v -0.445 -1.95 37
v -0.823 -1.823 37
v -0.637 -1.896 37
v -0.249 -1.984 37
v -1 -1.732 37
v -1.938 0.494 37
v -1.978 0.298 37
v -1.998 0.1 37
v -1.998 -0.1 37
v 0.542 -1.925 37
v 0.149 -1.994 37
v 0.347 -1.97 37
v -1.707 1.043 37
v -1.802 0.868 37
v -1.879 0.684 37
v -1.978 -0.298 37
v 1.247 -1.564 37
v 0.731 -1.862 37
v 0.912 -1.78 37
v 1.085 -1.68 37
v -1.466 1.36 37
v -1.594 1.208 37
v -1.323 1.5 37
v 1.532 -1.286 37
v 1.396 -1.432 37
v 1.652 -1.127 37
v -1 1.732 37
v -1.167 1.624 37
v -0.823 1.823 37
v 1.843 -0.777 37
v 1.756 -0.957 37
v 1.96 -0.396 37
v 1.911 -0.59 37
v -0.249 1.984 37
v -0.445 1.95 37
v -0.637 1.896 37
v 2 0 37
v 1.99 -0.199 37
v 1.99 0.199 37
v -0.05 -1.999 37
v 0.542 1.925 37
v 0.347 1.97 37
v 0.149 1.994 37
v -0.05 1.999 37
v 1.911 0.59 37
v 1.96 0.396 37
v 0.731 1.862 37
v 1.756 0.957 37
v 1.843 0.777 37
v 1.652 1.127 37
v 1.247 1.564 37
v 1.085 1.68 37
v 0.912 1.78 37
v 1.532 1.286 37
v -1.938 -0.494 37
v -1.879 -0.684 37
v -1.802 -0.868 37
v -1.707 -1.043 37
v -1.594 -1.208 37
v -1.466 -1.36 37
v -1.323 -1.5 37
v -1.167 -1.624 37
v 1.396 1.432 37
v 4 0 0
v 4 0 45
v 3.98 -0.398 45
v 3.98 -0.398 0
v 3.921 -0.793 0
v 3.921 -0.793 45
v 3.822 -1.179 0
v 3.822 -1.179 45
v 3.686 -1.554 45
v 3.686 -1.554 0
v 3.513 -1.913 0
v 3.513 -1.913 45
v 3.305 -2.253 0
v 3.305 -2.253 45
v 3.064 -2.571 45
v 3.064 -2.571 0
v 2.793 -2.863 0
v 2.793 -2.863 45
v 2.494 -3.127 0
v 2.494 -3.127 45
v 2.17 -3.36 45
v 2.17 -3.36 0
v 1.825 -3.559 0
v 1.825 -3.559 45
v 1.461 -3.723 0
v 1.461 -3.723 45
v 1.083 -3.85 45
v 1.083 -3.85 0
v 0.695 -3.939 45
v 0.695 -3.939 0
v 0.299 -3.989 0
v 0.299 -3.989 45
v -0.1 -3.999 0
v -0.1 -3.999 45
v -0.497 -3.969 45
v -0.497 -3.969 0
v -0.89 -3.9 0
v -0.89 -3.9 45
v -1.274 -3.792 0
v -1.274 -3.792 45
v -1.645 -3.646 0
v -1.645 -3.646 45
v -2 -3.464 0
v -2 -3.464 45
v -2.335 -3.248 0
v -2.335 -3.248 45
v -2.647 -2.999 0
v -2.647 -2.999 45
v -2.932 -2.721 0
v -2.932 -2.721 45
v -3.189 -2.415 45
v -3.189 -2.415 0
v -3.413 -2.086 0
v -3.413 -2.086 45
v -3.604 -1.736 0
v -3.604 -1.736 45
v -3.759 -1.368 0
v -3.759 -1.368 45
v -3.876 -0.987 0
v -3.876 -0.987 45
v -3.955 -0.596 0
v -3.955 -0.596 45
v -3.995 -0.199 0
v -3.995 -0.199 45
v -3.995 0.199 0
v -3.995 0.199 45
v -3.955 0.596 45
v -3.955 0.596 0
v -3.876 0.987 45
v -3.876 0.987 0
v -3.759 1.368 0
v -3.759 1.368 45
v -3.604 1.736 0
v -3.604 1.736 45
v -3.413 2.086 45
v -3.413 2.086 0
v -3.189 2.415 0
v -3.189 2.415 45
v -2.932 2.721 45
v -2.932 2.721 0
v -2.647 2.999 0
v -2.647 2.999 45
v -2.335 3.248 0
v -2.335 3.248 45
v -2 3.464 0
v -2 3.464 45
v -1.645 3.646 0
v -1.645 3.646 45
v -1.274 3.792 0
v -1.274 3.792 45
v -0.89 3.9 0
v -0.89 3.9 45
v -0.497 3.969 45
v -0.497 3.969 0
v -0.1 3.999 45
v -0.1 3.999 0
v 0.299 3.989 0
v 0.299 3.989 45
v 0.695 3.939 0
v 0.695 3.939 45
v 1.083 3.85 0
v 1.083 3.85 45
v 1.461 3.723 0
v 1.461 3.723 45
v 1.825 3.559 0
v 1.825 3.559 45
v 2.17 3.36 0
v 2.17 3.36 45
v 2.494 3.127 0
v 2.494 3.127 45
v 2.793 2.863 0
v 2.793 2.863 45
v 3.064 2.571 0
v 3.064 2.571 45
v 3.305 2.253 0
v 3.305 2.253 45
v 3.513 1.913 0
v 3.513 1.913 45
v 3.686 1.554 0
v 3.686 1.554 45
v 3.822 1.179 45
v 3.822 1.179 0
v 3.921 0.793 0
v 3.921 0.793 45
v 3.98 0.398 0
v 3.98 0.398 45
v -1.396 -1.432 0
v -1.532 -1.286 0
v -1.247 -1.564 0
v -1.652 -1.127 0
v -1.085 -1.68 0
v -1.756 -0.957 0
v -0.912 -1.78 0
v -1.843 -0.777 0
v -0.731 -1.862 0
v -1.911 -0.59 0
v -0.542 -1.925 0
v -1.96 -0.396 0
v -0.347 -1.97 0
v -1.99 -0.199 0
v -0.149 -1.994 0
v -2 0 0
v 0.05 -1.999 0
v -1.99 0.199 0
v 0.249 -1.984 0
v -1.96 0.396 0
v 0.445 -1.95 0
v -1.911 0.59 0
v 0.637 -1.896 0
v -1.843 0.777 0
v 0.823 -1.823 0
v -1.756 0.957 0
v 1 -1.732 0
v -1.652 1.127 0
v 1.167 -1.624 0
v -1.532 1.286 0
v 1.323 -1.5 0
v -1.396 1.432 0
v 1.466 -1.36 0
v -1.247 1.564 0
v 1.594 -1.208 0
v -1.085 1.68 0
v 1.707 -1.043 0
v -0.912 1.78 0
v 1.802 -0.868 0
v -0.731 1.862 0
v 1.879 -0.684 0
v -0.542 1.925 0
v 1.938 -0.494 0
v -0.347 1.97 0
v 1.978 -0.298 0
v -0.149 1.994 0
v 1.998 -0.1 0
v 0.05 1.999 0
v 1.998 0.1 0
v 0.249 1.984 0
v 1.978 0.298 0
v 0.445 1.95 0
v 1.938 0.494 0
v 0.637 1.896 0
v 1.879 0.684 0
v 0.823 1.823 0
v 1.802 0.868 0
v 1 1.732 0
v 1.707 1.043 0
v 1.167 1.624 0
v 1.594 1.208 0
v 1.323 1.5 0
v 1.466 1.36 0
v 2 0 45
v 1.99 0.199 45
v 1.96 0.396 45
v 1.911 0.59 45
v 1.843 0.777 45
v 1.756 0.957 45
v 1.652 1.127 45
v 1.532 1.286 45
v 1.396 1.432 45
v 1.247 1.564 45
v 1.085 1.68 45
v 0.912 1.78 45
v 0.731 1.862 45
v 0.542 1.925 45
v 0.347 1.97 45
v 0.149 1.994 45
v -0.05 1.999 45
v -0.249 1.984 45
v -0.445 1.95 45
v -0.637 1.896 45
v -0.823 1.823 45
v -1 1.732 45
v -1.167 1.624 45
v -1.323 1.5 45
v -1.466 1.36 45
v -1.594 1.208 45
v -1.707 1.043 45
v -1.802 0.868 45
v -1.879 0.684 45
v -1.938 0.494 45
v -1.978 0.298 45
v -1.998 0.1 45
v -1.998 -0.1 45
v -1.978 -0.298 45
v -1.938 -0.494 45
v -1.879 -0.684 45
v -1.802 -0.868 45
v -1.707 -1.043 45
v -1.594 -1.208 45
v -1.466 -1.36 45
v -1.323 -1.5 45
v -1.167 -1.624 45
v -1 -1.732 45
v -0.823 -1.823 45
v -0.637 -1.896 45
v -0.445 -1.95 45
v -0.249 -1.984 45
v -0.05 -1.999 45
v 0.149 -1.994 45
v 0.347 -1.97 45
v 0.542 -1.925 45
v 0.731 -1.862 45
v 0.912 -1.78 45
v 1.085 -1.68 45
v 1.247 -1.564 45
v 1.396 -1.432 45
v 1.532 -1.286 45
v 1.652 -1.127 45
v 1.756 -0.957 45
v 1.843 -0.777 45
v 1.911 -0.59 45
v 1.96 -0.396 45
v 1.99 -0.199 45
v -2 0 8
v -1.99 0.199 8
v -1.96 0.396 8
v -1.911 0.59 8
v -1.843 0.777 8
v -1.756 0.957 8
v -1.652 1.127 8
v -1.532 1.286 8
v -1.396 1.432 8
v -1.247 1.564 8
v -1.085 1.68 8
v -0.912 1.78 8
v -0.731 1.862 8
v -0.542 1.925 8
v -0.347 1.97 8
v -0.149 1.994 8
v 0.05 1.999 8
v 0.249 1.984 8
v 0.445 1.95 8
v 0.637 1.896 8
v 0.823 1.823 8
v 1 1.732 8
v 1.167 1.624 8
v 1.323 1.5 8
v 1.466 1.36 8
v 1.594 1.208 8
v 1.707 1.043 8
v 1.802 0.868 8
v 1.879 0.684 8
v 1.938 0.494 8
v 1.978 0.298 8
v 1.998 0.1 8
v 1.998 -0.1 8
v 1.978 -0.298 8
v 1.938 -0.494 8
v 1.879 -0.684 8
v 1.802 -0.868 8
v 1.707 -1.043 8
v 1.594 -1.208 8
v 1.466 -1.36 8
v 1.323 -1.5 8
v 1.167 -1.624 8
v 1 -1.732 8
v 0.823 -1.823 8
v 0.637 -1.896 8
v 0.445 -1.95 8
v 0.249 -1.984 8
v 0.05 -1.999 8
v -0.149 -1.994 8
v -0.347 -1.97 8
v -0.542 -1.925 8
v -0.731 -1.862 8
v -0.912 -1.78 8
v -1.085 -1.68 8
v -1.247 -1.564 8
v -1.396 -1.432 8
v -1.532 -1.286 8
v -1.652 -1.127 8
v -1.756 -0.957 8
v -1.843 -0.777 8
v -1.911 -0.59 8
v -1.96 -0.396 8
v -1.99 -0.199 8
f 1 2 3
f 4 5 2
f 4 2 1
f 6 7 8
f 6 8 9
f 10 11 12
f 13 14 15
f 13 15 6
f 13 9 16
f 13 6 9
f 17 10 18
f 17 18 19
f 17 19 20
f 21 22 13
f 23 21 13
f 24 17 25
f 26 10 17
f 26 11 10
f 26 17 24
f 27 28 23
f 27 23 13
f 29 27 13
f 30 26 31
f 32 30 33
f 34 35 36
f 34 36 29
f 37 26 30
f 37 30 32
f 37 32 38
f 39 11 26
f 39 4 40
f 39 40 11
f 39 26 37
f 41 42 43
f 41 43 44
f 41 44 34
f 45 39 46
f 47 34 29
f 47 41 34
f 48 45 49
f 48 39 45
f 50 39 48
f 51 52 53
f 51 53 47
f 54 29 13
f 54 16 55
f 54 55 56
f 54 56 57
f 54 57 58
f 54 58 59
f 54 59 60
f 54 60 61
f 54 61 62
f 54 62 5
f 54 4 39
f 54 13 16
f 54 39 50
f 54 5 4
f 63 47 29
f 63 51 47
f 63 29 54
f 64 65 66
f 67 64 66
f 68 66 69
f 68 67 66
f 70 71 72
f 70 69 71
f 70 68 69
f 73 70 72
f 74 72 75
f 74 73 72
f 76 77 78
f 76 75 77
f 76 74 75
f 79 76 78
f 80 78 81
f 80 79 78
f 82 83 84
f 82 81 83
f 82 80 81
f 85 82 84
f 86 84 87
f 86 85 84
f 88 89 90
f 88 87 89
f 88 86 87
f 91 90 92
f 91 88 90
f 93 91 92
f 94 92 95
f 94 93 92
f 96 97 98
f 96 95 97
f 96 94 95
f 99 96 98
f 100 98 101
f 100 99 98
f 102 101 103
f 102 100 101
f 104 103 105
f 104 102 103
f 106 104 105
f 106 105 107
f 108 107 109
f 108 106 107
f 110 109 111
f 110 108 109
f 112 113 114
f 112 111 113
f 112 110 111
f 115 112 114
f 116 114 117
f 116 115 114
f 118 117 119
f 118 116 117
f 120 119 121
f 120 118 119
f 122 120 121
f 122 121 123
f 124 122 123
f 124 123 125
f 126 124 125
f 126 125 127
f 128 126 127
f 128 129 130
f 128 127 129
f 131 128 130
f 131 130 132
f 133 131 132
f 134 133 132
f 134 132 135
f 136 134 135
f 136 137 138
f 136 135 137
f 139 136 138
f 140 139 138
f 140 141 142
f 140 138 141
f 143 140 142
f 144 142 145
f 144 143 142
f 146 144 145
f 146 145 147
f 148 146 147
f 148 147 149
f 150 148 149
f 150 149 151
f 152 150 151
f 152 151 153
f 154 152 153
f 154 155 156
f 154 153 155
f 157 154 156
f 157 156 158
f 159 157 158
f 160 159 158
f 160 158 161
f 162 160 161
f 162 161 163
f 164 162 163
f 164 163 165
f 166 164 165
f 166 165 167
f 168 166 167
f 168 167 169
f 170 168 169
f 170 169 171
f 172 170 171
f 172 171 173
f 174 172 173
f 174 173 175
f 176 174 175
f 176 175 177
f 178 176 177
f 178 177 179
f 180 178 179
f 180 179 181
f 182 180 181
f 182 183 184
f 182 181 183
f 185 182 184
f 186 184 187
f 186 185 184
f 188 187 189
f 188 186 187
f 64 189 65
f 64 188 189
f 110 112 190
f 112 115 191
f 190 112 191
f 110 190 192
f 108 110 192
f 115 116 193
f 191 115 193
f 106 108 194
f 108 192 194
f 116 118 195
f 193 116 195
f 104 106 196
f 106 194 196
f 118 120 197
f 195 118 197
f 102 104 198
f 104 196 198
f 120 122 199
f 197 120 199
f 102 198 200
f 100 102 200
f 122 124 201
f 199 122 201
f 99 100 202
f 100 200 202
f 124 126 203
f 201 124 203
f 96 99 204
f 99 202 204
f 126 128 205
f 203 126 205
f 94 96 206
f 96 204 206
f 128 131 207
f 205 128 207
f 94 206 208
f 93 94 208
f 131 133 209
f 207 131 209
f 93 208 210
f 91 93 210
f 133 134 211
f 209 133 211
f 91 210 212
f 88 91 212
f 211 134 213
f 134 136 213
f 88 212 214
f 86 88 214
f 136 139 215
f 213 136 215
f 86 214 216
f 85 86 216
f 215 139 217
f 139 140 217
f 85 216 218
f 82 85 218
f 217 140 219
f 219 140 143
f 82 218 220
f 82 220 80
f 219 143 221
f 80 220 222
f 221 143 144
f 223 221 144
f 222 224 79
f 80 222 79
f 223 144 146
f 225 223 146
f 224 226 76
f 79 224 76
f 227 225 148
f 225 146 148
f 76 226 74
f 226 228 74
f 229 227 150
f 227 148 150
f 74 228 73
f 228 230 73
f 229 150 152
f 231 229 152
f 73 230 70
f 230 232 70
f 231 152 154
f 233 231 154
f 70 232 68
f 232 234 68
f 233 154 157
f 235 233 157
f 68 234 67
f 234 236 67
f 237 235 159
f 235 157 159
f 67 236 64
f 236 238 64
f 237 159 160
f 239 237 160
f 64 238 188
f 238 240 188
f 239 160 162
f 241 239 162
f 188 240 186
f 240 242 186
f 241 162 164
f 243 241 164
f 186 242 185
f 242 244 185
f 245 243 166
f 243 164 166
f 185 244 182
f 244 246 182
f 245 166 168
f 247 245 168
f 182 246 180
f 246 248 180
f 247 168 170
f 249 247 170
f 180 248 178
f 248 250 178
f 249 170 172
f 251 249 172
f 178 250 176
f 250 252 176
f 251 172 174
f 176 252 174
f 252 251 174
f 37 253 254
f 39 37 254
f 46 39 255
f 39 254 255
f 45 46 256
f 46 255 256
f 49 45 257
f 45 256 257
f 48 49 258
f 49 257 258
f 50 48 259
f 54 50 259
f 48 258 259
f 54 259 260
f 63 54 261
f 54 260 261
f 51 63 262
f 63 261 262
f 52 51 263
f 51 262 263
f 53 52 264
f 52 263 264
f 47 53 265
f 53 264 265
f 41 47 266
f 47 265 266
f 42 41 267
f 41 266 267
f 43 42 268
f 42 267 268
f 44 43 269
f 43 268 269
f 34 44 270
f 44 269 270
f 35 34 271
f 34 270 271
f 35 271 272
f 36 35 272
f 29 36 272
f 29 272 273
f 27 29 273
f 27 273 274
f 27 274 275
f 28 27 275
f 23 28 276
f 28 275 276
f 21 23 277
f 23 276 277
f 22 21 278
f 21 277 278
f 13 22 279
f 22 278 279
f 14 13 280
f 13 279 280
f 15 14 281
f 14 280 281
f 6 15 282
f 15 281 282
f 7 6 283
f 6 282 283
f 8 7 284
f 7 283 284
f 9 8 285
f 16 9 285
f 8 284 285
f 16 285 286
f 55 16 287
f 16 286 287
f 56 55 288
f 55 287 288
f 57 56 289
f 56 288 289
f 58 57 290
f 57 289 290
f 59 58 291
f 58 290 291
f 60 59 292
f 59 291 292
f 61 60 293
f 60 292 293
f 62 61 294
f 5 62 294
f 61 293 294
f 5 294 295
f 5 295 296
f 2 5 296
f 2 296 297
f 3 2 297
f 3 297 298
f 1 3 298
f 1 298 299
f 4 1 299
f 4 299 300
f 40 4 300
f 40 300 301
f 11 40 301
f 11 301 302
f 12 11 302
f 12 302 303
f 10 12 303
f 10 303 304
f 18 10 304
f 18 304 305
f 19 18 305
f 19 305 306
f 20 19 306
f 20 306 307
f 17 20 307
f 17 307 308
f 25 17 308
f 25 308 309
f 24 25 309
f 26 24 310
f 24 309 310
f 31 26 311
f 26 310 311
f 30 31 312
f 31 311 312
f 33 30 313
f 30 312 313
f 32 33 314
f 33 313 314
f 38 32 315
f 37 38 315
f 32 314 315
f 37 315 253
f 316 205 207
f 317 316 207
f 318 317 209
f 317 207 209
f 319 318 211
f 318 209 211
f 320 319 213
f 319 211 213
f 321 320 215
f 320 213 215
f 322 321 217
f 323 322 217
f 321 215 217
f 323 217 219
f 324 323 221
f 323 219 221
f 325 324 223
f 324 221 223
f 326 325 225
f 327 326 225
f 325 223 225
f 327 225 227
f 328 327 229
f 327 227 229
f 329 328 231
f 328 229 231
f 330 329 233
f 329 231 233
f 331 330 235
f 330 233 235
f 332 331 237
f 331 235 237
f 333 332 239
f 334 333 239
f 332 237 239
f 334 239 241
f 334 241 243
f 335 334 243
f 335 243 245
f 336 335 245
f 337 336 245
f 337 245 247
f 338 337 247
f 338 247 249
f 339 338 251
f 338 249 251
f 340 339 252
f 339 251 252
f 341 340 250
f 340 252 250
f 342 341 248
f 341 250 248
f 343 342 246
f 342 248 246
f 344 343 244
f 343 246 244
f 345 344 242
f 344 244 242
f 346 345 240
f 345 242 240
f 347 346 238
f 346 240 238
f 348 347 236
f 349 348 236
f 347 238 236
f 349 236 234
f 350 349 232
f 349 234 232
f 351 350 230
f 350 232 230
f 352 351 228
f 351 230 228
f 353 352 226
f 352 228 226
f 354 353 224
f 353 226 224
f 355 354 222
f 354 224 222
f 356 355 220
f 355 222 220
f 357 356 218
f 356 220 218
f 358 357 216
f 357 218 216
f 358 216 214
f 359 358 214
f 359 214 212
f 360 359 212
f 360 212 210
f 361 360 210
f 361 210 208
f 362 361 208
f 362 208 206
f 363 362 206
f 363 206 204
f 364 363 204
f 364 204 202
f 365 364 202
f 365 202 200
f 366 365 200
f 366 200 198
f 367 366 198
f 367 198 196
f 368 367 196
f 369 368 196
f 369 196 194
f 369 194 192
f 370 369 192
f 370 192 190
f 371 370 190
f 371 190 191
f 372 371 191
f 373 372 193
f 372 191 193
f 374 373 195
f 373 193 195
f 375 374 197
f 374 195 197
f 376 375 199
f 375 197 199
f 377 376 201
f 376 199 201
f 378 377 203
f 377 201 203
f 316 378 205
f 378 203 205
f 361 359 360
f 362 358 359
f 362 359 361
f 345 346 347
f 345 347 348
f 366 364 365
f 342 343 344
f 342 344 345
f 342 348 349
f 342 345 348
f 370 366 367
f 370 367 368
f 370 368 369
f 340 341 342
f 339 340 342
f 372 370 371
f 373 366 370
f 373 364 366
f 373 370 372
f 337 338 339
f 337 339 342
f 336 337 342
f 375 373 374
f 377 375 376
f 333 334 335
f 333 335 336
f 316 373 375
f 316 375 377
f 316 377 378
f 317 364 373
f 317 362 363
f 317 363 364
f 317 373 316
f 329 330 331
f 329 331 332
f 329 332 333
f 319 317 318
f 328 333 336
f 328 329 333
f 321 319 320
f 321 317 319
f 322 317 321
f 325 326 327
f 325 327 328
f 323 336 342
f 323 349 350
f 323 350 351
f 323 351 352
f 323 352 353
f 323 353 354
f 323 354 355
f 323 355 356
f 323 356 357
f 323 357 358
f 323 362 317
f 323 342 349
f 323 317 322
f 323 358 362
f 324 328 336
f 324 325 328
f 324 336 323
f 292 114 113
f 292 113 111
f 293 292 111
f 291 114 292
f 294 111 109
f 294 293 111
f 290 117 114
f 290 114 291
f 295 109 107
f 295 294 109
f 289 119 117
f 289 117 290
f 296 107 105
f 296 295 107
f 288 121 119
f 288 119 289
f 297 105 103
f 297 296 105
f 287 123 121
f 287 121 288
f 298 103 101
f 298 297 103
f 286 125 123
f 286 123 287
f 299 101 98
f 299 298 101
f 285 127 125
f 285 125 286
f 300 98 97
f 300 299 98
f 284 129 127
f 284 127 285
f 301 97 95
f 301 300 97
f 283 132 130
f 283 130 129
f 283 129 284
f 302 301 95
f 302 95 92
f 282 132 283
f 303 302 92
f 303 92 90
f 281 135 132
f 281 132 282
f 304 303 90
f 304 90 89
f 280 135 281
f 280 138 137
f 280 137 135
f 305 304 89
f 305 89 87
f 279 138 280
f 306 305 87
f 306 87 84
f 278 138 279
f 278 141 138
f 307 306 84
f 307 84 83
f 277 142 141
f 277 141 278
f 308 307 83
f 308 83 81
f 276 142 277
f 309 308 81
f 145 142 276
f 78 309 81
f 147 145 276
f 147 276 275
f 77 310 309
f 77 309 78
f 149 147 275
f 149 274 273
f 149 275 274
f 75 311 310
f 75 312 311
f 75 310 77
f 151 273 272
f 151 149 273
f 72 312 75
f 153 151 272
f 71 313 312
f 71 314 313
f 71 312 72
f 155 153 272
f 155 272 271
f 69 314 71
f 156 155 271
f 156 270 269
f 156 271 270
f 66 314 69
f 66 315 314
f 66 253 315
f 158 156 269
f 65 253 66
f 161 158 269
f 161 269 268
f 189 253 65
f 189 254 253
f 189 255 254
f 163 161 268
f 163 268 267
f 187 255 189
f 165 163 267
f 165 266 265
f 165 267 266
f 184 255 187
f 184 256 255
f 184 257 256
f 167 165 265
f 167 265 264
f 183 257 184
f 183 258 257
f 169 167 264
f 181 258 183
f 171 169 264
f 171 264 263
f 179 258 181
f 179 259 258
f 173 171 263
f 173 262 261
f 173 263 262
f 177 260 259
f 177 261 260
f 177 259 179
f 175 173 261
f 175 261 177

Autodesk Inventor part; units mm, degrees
ref_plane "YZ Plane" through (0, 0, 0) normal (1, 0, 0) x (0, 1, 0)
ref_plane "XZ Plane" through (0, 0, 0) normal (0, 1, 0) x (-1, 0, 0)
ref_plane "XY Plane" through (0, 0, 0) normal (0, 0, 1) x (1, 0, 0)
sketch "スケッチ1" plane through (0, 0, 0) normal (0, 0, 1) x (1, 0, 0)
  circle A0 centre (0, 0) radius 4
  circle A1 centre (0, 0) radius 2
  dimension "d0" = 8
  dimension "d1" = 4
extrude "押し出し1" add sketch "スケッチ1" along normal blind 45 contours A0 | A1
sketch "スケッチ2" plane through (0, 0, 45) normal (0, 0, 1) x (1, 0, 0)
  circle A0 centre (0, 0) radius 2
  dimension "d4" = 4
extrude "押し出し2" cut sketch "スケッチ2" against normal blind 8
sketch "スケッチ3" plane through (0, 0, 0) normal (0, 0, -1) x (-1, 0, 0)
  circle A0 centre (0, 0) radius 2
  dimension "d7" = 4
extrude "押し出し3" cut sketch "スケッチ3" against normal blind 8
properties part number "スペーサーm4,45" material "アルミニウム 7075"
